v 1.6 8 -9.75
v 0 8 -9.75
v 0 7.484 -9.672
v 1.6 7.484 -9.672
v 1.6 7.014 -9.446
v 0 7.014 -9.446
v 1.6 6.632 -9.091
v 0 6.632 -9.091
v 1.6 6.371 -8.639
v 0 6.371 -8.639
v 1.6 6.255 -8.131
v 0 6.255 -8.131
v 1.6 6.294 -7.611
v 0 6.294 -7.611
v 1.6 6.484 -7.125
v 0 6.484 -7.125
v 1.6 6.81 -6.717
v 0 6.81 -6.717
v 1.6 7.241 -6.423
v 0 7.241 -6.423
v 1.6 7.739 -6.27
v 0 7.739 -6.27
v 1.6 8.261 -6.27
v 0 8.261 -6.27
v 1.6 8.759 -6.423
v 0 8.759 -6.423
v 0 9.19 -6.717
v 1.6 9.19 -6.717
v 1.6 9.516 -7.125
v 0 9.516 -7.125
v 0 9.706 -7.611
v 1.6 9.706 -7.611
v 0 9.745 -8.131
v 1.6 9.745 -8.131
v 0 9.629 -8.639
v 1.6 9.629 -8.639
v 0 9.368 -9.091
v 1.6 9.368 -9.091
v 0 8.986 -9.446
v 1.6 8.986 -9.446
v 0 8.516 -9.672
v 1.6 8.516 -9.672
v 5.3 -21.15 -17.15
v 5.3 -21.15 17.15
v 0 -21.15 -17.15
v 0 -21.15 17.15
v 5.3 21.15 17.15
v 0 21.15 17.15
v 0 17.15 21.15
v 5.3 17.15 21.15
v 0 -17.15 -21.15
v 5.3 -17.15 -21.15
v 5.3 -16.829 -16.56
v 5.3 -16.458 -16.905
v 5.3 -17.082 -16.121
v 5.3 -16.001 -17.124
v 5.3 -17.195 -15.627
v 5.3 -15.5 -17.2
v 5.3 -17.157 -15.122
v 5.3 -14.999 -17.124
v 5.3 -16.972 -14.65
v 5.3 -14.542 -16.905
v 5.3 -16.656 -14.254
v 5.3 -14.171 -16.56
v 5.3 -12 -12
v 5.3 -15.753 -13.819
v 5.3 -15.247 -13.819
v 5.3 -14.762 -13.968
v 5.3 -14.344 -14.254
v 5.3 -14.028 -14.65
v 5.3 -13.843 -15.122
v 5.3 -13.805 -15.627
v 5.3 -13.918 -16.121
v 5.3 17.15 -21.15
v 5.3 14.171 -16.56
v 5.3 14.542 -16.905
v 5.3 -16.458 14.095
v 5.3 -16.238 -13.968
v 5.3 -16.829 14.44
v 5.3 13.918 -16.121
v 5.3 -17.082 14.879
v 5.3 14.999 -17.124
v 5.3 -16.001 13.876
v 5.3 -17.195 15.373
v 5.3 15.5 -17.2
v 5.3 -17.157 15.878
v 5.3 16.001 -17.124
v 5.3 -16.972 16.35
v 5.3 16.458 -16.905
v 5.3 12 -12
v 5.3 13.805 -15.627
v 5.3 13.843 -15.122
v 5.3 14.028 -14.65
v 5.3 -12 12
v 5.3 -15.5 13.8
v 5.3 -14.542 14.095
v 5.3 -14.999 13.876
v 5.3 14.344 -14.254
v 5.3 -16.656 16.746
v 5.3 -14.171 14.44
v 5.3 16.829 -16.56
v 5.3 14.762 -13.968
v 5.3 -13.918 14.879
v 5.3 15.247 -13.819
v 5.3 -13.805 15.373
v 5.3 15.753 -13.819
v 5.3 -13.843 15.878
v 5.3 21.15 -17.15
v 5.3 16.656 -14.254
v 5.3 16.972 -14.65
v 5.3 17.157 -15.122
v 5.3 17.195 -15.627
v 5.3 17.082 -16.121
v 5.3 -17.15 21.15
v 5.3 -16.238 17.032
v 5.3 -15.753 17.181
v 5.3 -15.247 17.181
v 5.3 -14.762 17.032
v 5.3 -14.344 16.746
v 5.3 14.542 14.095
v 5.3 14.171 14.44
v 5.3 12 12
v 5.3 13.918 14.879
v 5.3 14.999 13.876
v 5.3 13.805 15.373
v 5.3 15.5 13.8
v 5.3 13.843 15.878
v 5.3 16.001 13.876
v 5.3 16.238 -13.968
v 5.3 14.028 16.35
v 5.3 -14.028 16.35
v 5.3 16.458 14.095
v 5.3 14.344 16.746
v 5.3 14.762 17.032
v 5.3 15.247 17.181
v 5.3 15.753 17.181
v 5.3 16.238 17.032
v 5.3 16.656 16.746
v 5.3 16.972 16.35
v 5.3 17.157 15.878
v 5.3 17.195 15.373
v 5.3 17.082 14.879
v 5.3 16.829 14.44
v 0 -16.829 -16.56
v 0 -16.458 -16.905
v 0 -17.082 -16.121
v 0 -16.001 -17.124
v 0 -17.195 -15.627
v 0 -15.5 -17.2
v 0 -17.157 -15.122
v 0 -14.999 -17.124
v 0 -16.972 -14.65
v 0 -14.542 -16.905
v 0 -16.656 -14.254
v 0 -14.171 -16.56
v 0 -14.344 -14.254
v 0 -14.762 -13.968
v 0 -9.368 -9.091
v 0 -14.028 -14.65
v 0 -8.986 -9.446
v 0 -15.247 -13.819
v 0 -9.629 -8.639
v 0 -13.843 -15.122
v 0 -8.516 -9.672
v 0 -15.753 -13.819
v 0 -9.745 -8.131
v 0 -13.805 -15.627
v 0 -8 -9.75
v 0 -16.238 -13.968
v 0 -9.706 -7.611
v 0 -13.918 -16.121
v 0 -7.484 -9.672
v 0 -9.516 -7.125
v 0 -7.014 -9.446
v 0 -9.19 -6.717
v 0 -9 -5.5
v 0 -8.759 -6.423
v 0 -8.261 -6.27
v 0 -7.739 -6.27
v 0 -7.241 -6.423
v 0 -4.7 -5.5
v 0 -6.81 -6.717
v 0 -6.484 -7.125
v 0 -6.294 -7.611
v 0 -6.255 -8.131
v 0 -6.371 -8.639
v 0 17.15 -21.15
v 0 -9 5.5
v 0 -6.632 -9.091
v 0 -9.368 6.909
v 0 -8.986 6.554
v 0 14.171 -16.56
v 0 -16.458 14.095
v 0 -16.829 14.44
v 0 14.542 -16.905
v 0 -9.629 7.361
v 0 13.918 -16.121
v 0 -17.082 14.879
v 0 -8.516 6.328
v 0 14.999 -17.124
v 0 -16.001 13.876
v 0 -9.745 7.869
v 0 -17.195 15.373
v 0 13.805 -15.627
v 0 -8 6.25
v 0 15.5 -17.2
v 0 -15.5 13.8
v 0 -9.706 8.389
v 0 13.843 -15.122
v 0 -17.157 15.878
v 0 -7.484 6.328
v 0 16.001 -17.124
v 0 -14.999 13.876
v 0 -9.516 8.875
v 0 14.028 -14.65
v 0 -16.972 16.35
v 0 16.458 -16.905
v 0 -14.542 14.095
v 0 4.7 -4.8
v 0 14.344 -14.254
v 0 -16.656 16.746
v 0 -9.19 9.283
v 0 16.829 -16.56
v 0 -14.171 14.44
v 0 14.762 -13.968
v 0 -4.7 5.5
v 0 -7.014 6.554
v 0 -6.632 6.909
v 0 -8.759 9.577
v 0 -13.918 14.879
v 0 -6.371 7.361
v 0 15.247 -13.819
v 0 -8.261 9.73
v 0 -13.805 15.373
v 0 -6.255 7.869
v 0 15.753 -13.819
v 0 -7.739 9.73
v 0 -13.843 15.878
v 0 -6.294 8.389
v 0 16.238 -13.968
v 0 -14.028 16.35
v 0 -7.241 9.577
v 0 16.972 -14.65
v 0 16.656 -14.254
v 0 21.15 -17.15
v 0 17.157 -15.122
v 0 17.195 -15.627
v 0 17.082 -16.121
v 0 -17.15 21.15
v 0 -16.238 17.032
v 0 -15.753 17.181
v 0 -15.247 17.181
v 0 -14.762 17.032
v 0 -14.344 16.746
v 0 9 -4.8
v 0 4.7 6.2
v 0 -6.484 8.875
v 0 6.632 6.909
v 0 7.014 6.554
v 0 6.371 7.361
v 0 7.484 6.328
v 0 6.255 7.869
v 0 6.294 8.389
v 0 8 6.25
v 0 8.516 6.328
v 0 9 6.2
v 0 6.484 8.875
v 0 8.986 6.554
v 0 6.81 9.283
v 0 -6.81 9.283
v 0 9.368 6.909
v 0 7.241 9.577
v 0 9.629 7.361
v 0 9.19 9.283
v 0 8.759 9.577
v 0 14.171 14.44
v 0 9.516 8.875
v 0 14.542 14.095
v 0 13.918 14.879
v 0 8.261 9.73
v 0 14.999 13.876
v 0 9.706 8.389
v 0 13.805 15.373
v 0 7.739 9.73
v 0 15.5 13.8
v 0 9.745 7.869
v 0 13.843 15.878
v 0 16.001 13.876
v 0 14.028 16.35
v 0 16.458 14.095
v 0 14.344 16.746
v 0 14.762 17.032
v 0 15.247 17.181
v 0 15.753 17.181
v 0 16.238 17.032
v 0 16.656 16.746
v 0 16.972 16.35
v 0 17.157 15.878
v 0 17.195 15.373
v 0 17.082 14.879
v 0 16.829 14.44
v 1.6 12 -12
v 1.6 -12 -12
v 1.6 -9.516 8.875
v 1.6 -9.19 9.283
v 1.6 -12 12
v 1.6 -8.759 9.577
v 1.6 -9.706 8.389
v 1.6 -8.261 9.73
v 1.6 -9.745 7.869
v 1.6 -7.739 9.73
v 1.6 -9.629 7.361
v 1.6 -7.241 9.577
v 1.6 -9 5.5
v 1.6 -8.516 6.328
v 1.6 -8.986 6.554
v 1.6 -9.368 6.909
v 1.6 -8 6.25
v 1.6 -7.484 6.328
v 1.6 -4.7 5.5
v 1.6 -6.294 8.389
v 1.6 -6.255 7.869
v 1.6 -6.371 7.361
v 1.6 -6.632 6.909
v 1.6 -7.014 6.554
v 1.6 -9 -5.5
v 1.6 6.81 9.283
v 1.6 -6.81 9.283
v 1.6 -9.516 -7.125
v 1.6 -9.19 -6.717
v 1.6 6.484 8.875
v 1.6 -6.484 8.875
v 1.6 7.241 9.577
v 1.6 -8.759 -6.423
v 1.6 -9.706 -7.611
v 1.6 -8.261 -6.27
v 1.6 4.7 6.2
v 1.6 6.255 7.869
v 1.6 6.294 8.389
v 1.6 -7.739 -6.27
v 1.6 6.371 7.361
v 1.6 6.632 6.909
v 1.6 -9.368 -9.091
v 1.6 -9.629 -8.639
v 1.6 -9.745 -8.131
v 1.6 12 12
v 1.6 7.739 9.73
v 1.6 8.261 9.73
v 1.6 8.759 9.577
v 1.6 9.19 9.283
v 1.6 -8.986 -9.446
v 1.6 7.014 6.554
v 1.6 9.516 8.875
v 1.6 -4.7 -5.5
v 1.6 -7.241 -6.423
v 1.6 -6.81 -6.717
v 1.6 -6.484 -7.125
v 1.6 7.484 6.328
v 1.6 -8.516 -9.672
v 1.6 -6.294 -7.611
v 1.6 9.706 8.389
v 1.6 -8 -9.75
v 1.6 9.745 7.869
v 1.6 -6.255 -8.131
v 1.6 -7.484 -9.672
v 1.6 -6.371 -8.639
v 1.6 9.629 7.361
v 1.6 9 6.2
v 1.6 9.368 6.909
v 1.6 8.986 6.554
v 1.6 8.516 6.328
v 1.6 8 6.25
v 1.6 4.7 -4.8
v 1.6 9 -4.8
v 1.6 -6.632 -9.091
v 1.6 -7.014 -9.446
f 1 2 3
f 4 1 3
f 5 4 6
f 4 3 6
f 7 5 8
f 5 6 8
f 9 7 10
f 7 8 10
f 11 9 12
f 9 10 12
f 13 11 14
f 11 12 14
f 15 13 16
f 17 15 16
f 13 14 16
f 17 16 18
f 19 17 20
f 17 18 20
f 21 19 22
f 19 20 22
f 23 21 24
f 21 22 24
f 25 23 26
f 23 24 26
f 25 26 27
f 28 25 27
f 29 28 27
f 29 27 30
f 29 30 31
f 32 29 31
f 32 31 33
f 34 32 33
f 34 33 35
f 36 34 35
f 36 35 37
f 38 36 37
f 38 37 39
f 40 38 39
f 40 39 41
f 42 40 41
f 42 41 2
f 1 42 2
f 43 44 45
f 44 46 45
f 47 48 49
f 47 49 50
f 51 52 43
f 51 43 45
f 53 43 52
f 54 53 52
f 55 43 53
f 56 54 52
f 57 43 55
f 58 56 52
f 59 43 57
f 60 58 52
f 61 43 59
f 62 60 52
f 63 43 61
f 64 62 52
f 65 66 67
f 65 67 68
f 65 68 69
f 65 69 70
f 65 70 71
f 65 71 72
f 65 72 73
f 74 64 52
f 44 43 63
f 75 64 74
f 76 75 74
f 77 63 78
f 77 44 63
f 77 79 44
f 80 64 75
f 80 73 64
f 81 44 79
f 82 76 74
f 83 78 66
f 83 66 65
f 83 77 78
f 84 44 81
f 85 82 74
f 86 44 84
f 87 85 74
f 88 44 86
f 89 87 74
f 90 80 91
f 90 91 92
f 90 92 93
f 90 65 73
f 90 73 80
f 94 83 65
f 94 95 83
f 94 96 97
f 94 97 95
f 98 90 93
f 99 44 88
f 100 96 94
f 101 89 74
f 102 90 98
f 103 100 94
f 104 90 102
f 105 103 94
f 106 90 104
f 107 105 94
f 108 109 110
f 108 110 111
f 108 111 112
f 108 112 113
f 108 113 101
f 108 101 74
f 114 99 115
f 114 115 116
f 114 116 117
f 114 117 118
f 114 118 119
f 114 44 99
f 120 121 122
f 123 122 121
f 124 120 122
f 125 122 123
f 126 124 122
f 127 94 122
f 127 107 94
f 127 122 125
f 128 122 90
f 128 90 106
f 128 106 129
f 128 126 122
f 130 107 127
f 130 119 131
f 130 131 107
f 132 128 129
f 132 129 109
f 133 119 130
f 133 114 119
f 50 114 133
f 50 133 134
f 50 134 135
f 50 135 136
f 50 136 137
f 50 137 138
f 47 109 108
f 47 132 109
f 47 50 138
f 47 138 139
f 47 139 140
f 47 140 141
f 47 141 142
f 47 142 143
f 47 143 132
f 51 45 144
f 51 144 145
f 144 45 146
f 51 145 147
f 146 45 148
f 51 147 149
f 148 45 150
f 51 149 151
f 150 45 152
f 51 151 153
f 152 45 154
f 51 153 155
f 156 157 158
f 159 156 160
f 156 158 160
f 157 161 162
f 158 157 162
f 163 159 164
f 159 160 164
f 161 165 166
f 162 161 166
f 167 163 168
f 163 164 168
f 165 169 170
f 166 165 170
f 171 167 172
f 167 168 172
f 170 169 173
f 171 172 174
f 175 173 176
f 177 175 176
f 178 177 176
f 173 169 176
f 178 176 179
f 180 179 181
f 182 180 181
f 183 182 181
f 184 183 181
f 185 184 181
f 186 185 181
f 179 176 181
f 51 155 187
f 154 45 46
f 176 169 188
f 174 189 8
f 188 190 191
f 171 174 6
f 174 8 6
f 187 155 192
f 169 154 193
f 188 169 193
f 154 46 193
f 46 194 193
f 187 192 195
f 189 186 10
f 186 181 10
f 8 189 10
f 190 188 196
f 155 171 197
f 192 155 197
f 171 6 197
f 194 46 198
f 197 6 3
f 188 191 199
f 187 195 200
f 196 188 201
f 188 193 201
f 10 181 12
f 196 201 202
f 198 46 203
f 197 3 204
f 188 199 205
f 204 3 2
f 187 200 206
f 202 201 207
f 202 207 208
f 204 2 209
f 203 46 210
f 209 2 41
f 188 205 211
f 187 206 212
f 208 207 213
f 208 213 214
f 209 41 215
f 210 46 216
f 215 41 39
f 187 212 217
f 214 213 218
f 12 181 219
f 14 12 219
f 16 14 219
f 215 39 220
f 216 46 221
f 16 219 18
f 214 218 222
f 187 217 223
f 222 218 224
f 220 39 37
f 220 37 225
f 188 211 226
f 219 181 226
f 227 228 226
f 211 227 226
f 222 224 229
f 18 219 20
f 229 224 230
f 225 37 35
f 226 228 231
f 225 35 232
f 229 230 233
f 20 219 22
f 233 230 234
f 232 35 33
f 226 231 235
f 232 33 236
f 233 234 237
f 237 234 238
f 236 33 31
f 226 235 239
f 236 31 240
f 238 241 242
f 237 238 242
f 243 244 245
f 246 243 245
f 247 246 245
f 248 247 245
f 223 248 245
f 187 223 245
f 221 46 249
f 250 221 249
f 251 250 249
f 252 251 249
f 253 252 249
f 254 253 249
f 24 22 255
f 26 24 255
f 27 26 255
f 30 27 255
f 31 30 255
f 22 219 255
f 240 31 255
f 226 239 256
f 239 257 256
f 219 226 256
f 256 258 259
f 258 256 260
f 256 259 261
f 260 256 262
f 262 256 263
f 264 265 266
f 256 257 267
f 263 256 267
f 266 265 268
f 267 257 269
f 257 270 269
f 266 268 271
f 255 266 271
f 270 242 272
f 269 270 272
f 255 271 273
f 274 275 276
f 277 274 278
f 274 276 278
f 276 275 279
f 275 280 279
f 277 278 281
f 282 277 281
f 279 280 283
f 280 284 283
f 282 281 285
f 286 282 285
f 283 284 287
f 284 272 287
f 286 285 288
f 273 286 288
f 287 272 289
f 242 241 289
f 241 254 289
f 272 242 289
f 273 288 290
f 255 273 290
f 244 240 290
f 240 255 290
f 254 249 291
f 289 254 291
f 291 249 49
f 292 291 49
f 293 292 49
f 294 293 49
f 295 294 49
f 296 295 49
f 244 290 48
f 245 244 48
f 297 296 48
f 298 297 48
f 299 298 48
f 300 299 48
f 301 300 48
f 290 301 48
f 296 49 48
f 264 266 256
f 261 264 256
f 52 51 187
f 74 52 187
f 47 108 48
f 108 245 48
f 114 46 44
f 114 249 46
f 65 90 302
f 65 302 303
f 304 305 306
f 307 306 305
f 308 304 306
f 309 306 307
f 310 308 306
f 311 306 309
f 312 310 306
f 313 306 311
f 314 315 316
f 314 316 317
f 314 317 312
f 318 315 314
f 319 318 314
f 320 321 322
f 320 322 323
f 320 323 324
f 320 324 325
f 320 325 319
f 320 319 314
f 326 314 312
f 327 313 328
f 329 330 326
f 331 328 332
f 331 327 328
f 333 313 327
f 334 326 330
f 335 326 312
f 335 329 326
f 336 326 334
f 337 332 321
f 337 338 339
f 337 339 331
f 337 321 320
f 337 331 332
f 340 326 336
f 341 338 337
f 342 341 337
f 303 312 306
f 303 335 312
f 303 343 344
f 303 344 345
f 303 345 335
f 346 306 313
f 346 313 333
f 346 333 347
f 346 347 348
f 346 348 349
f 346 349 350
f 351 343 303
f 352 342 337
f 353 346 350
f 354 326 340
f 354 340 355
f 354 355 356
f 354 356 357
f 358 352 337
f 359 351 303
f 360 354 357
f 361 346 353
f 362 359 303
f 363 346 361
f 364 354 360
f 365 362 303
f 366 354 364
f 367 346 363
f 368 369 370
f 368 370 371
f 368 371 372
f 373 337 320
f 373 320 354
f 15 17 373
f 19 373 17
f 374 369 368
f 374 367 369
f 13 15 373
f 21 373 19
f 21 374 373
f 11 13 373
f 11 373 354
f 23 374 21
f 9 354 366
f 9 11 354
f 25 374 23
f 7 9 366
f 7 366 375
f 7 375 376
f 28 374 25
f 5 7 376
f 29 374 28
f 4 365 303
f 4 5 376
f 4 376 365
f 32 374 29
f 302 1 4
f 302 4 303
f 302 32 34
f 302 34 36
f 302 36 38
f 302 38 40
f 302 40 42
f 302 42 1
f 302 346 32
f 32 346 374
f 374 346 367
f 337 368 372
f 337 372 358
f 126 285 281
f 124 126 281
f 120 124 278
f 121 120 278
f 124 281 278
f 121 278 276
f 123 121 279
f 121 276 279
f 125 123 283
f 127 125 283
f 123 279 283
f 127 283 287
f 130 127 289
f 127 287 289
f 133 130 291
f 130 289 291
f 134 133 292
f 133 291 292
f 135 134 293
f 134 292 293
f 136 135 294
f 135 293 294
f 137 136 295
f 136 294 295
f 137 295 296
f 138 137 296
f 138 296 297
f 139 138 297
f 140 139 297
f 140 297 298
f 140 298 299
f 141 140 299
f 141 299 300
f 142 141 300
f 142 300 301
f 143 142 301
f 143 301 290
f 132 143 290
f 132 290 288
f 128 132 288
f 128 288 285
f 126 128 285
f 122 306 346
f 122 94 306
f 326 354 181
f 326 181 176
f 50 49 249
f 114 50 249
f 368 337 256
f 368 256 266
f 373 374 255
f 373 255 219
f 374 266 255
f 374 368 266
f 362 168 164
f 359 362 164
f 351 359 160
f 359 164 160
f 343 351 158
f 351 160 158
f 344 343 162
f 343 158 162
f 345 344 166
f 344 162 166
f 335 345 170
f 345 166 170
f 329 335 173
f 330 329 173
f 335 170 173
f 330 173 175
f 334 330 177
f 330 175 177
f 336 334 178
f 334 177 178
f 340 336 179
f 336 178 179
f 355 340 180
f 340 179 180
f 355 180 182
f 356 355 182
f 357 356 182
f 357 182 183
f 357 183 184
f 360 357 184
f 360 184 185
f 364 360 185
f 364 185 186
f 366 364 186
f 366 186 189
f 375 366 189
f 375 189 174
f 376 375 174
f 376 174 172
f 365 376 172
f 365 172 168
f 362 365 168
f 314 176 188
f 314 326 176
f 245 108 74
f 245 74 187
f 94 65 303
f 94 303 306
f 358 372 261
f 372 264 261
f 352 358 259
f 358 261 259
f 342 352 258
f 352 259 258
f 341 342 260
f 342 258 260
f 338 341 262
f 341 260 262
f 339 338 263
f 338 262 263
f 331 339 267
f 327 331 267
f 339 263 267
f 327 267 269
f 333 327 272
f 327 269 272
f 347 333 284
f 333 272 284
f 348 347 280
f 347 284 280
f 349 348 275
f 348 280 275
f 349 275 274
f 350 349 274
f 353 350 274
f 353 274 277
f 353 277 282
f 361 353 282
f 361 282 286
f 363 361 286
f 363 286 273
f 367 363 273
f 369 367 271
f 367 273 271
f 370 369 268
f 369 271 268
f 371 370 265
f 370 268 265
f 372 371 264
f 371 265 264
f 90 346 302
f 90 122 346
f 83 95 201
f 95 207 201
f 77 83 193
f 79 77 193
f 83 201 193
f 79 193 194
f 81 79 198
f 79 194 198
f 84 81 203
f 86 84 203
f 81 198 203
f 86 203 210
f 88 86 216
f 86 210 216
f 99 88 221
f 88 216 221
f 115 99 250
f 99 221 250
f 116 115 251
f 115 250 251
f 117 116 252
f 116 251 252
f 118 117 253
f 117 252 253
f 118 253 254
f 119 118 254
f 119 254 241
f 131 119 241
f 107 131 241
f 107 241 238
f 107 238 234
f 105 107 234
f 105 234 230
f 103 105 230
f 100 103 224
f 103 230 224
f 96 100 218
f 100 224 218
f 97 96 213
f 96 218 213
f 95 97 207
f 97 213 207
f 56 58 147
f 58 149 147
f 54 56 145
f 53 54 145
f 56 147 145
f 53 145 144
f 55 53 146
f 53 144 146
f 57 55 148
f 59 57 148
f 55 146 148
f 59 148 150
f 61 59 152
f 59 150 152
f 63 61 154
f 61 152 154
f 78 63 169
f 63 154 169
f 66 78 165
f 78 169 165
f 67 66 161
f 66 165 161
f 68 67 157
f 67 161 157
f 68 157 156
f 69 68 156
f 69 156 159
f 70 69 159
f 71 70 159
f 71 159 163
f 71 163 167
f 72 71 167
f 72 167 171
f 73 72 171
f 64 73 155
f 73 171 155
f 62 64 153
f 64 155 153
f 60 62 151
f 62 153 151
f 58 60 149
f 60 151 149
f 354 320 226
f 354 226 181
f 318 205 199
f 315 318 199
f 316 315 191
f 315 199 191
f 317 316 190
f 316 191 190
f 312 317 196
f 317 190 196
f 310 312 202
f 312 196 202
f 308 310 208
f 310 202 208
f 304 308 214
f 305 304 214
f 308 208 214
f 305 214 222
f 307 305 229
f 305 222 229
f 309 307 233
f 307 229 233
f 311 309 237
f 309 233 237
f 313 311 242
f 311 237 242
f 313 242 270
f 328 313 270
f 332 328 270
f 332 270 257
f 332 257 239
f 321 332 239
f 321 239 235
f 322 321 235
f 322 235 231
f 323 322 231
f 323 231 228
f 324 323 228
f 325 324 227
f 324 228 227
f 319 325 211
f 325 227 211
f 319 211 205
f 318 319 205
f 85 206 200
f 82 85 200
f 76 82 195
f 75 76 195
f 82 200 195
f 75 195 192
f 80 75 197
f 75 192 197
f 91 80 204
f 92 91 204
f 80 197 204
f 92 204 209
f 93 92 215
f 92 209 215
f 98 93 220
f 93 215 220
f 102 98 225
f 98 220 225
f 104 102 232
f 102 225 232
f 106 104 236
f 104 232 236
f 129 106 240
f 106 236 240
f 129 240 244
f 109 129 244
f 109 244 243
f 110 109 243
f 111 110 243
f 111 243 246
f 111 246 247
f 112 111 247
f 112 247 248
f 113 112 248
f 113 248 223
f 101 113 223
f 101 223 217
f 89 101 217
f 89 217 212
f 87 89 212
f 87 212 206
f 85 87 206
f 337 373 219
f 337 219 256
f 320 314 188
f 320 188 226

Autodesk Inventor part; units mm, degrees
ref_plane "YZ Plane" through (0, 0, 0) normal (1, 0, 0) x (0, 1, 0)
ref_plane "XZ Plane" through (0, 0, 0) normal (0, 1, 0) x (-1, 0, 0)
ref_plane "XY Plane" through (0, 0, 0) normal (0, 0, 1) x (1, 0, 0)
sketch "Skizze1" plane through (0, 0, 0) normal (1, 0, 0) x (0, 1, 0)
  line L0 (-21.15, -21.15) -> (21.15, -21.15)
  line L1 (21.15, -21.15) -> (21.15, 21.15)
  line L2 (21.15, 21.15) -> (-21.15, 21.15)
  line L3 (-21.15, 21.15) -> (-21.15, -21.15)
  line L4 (-21.15, -21.15) -> (21.15, 21.15) construction
  line L5 (21.15, -21.15) -> (-21.15, 21.15) construction
  point P0 (0, 0)
  dimension "d0" = 42.3
  dimension "d1" = 42.3
extrude "Extrusion1" add sketch "Skizze1" along normal blind 5.3
sketch "Skizze2" plane through (5.3, 0, 0) normal (1, 0, 0) x (0, 0, -1)
  line L0 (12, -12) -> (-12, -12)
  line L1 (-12, -12) -> (-12, 12)
  line L2 (-12, 12) -> (12, 12)
  line L3 (12, 12) -> (12, -12)
  line L4 (12, -12) -> (-12, 12) construction
  line L5 (-12, -12) -> (12, 12) construction
  point P0 (0, 0)
  dimension "d4" = 24
  dimension "d5" = 24
extrude "Extrusion2" cut sketch "Skizze2" against normal blind 3.7
sketch "Skizze3" plane through (1.6, 0, 0) normal (1, 0, 0) x (0, 0, -1)
  point P0 (0, 0)
  point P1 (-8, 8)
  point P2 (8, 8)
  point P3 (8, -8)
  point P4 (-8, -8)
  dimension "d16" = 8
  dimension "d17" = 8
  dimension "d18" = 8
  dimension "d19" = 8
  dimension "d20" = 8
  dimension "d21" = 8
  dimension "d22" = 8
  dimension "d23" = 8
hole "Bohrung1" at (1.6, 8, 8) at (1.6, 8, -8) at (1.6, -8, -8) at (1.6, -8, 8) direction (-1, 0, 0) diameter 3.5 end through all
sketch "Skizze4" plane through (5.3, 0, 0) normal (1, 0, 0) x (0, 0, -1)
  point P0 (0, 0)
  point P1 (-15.5, 15.5)
  point P2 (15.5, 15.5)
  point P3 (15.5, -15.5)
  point P4 (-15.5, -15.5)
  dimension "d31" = 15.5
  dimension "d32" = 15.5
  dimension "d33" = 15.5
  dimension "d34" = 15.5
  dimension "d35" = 15.5
  dimension "d36" = 15.5
  dimension "d37" = 15.5
  dimension "d38" = 15.5
hole "Bohrung2" at (5.3, 15.5, 15.5) at (5.3, 15.5, -15.5) at (5.3, -15.5, -15.5) at (5.3, -15.5, 15.5) direction (-1, 0, 0) diameter 3.4 end through all
chamfer "Fase1" distance 4 angle 45 4 edges at (2.65, -21.15, -21.15) (2.65, -21.15, 21.15) (2.65, 21.15, -21.15) (2.65, 21.15, 21.15)
sketch "Skizze5" plane through (1.6, 0, 0) normal (1, 0, 0) x (0, 0, -1)
  line L0 (-6.2, 9) -> (4.8, 9)
  line L1 (4.8, 9) -> (4.8, 4.7)
  line L2 (4.8, 4.7) -> (-6.2, 4.7)
  line L3 (-6.2, 4.7) -> (-6.2, 9)
  line L4 (-12, 12) -> (12, 12) projected
  line L5 (-12, -12) -> (-12, 12) projected
  point P0 (0, 0)
  point P1 (-6.2, 6.85)
  dimension "d42" = 11
  dimension "d43" = 4.3
  dimension "d44" = 3
  dimension "d45" = 5.8
sketch "Skizze6" plane through (1.6, 0, 0) normal (1, 0, 0) x (0, 0, -1)
  line L0 (-5.5, -4.7) -> (5.5, -4.7)
  line L1 (5.5, -4.7) -> (5.5, -9)
  line L2 (5.5, -9) -> (-5.5, -9)
  line L3 (-5.5, -9) -> (-5.5, -4.7)
  line L4 (12, -12) -> (-12, -12) projected
  point P0 (0, 0)
  dimension "d46" = 11
  dimension "d47" = 4.3
  dimension "d48" = 3
  dimension "d49" = 5.5
extrude "Extrusion3" cut sketch "Skizze5" against normal blind 10
extrude "Extrusion4" cut sketch "Skizze6" against normal blind 10
properties part number "EncoderHalter"
